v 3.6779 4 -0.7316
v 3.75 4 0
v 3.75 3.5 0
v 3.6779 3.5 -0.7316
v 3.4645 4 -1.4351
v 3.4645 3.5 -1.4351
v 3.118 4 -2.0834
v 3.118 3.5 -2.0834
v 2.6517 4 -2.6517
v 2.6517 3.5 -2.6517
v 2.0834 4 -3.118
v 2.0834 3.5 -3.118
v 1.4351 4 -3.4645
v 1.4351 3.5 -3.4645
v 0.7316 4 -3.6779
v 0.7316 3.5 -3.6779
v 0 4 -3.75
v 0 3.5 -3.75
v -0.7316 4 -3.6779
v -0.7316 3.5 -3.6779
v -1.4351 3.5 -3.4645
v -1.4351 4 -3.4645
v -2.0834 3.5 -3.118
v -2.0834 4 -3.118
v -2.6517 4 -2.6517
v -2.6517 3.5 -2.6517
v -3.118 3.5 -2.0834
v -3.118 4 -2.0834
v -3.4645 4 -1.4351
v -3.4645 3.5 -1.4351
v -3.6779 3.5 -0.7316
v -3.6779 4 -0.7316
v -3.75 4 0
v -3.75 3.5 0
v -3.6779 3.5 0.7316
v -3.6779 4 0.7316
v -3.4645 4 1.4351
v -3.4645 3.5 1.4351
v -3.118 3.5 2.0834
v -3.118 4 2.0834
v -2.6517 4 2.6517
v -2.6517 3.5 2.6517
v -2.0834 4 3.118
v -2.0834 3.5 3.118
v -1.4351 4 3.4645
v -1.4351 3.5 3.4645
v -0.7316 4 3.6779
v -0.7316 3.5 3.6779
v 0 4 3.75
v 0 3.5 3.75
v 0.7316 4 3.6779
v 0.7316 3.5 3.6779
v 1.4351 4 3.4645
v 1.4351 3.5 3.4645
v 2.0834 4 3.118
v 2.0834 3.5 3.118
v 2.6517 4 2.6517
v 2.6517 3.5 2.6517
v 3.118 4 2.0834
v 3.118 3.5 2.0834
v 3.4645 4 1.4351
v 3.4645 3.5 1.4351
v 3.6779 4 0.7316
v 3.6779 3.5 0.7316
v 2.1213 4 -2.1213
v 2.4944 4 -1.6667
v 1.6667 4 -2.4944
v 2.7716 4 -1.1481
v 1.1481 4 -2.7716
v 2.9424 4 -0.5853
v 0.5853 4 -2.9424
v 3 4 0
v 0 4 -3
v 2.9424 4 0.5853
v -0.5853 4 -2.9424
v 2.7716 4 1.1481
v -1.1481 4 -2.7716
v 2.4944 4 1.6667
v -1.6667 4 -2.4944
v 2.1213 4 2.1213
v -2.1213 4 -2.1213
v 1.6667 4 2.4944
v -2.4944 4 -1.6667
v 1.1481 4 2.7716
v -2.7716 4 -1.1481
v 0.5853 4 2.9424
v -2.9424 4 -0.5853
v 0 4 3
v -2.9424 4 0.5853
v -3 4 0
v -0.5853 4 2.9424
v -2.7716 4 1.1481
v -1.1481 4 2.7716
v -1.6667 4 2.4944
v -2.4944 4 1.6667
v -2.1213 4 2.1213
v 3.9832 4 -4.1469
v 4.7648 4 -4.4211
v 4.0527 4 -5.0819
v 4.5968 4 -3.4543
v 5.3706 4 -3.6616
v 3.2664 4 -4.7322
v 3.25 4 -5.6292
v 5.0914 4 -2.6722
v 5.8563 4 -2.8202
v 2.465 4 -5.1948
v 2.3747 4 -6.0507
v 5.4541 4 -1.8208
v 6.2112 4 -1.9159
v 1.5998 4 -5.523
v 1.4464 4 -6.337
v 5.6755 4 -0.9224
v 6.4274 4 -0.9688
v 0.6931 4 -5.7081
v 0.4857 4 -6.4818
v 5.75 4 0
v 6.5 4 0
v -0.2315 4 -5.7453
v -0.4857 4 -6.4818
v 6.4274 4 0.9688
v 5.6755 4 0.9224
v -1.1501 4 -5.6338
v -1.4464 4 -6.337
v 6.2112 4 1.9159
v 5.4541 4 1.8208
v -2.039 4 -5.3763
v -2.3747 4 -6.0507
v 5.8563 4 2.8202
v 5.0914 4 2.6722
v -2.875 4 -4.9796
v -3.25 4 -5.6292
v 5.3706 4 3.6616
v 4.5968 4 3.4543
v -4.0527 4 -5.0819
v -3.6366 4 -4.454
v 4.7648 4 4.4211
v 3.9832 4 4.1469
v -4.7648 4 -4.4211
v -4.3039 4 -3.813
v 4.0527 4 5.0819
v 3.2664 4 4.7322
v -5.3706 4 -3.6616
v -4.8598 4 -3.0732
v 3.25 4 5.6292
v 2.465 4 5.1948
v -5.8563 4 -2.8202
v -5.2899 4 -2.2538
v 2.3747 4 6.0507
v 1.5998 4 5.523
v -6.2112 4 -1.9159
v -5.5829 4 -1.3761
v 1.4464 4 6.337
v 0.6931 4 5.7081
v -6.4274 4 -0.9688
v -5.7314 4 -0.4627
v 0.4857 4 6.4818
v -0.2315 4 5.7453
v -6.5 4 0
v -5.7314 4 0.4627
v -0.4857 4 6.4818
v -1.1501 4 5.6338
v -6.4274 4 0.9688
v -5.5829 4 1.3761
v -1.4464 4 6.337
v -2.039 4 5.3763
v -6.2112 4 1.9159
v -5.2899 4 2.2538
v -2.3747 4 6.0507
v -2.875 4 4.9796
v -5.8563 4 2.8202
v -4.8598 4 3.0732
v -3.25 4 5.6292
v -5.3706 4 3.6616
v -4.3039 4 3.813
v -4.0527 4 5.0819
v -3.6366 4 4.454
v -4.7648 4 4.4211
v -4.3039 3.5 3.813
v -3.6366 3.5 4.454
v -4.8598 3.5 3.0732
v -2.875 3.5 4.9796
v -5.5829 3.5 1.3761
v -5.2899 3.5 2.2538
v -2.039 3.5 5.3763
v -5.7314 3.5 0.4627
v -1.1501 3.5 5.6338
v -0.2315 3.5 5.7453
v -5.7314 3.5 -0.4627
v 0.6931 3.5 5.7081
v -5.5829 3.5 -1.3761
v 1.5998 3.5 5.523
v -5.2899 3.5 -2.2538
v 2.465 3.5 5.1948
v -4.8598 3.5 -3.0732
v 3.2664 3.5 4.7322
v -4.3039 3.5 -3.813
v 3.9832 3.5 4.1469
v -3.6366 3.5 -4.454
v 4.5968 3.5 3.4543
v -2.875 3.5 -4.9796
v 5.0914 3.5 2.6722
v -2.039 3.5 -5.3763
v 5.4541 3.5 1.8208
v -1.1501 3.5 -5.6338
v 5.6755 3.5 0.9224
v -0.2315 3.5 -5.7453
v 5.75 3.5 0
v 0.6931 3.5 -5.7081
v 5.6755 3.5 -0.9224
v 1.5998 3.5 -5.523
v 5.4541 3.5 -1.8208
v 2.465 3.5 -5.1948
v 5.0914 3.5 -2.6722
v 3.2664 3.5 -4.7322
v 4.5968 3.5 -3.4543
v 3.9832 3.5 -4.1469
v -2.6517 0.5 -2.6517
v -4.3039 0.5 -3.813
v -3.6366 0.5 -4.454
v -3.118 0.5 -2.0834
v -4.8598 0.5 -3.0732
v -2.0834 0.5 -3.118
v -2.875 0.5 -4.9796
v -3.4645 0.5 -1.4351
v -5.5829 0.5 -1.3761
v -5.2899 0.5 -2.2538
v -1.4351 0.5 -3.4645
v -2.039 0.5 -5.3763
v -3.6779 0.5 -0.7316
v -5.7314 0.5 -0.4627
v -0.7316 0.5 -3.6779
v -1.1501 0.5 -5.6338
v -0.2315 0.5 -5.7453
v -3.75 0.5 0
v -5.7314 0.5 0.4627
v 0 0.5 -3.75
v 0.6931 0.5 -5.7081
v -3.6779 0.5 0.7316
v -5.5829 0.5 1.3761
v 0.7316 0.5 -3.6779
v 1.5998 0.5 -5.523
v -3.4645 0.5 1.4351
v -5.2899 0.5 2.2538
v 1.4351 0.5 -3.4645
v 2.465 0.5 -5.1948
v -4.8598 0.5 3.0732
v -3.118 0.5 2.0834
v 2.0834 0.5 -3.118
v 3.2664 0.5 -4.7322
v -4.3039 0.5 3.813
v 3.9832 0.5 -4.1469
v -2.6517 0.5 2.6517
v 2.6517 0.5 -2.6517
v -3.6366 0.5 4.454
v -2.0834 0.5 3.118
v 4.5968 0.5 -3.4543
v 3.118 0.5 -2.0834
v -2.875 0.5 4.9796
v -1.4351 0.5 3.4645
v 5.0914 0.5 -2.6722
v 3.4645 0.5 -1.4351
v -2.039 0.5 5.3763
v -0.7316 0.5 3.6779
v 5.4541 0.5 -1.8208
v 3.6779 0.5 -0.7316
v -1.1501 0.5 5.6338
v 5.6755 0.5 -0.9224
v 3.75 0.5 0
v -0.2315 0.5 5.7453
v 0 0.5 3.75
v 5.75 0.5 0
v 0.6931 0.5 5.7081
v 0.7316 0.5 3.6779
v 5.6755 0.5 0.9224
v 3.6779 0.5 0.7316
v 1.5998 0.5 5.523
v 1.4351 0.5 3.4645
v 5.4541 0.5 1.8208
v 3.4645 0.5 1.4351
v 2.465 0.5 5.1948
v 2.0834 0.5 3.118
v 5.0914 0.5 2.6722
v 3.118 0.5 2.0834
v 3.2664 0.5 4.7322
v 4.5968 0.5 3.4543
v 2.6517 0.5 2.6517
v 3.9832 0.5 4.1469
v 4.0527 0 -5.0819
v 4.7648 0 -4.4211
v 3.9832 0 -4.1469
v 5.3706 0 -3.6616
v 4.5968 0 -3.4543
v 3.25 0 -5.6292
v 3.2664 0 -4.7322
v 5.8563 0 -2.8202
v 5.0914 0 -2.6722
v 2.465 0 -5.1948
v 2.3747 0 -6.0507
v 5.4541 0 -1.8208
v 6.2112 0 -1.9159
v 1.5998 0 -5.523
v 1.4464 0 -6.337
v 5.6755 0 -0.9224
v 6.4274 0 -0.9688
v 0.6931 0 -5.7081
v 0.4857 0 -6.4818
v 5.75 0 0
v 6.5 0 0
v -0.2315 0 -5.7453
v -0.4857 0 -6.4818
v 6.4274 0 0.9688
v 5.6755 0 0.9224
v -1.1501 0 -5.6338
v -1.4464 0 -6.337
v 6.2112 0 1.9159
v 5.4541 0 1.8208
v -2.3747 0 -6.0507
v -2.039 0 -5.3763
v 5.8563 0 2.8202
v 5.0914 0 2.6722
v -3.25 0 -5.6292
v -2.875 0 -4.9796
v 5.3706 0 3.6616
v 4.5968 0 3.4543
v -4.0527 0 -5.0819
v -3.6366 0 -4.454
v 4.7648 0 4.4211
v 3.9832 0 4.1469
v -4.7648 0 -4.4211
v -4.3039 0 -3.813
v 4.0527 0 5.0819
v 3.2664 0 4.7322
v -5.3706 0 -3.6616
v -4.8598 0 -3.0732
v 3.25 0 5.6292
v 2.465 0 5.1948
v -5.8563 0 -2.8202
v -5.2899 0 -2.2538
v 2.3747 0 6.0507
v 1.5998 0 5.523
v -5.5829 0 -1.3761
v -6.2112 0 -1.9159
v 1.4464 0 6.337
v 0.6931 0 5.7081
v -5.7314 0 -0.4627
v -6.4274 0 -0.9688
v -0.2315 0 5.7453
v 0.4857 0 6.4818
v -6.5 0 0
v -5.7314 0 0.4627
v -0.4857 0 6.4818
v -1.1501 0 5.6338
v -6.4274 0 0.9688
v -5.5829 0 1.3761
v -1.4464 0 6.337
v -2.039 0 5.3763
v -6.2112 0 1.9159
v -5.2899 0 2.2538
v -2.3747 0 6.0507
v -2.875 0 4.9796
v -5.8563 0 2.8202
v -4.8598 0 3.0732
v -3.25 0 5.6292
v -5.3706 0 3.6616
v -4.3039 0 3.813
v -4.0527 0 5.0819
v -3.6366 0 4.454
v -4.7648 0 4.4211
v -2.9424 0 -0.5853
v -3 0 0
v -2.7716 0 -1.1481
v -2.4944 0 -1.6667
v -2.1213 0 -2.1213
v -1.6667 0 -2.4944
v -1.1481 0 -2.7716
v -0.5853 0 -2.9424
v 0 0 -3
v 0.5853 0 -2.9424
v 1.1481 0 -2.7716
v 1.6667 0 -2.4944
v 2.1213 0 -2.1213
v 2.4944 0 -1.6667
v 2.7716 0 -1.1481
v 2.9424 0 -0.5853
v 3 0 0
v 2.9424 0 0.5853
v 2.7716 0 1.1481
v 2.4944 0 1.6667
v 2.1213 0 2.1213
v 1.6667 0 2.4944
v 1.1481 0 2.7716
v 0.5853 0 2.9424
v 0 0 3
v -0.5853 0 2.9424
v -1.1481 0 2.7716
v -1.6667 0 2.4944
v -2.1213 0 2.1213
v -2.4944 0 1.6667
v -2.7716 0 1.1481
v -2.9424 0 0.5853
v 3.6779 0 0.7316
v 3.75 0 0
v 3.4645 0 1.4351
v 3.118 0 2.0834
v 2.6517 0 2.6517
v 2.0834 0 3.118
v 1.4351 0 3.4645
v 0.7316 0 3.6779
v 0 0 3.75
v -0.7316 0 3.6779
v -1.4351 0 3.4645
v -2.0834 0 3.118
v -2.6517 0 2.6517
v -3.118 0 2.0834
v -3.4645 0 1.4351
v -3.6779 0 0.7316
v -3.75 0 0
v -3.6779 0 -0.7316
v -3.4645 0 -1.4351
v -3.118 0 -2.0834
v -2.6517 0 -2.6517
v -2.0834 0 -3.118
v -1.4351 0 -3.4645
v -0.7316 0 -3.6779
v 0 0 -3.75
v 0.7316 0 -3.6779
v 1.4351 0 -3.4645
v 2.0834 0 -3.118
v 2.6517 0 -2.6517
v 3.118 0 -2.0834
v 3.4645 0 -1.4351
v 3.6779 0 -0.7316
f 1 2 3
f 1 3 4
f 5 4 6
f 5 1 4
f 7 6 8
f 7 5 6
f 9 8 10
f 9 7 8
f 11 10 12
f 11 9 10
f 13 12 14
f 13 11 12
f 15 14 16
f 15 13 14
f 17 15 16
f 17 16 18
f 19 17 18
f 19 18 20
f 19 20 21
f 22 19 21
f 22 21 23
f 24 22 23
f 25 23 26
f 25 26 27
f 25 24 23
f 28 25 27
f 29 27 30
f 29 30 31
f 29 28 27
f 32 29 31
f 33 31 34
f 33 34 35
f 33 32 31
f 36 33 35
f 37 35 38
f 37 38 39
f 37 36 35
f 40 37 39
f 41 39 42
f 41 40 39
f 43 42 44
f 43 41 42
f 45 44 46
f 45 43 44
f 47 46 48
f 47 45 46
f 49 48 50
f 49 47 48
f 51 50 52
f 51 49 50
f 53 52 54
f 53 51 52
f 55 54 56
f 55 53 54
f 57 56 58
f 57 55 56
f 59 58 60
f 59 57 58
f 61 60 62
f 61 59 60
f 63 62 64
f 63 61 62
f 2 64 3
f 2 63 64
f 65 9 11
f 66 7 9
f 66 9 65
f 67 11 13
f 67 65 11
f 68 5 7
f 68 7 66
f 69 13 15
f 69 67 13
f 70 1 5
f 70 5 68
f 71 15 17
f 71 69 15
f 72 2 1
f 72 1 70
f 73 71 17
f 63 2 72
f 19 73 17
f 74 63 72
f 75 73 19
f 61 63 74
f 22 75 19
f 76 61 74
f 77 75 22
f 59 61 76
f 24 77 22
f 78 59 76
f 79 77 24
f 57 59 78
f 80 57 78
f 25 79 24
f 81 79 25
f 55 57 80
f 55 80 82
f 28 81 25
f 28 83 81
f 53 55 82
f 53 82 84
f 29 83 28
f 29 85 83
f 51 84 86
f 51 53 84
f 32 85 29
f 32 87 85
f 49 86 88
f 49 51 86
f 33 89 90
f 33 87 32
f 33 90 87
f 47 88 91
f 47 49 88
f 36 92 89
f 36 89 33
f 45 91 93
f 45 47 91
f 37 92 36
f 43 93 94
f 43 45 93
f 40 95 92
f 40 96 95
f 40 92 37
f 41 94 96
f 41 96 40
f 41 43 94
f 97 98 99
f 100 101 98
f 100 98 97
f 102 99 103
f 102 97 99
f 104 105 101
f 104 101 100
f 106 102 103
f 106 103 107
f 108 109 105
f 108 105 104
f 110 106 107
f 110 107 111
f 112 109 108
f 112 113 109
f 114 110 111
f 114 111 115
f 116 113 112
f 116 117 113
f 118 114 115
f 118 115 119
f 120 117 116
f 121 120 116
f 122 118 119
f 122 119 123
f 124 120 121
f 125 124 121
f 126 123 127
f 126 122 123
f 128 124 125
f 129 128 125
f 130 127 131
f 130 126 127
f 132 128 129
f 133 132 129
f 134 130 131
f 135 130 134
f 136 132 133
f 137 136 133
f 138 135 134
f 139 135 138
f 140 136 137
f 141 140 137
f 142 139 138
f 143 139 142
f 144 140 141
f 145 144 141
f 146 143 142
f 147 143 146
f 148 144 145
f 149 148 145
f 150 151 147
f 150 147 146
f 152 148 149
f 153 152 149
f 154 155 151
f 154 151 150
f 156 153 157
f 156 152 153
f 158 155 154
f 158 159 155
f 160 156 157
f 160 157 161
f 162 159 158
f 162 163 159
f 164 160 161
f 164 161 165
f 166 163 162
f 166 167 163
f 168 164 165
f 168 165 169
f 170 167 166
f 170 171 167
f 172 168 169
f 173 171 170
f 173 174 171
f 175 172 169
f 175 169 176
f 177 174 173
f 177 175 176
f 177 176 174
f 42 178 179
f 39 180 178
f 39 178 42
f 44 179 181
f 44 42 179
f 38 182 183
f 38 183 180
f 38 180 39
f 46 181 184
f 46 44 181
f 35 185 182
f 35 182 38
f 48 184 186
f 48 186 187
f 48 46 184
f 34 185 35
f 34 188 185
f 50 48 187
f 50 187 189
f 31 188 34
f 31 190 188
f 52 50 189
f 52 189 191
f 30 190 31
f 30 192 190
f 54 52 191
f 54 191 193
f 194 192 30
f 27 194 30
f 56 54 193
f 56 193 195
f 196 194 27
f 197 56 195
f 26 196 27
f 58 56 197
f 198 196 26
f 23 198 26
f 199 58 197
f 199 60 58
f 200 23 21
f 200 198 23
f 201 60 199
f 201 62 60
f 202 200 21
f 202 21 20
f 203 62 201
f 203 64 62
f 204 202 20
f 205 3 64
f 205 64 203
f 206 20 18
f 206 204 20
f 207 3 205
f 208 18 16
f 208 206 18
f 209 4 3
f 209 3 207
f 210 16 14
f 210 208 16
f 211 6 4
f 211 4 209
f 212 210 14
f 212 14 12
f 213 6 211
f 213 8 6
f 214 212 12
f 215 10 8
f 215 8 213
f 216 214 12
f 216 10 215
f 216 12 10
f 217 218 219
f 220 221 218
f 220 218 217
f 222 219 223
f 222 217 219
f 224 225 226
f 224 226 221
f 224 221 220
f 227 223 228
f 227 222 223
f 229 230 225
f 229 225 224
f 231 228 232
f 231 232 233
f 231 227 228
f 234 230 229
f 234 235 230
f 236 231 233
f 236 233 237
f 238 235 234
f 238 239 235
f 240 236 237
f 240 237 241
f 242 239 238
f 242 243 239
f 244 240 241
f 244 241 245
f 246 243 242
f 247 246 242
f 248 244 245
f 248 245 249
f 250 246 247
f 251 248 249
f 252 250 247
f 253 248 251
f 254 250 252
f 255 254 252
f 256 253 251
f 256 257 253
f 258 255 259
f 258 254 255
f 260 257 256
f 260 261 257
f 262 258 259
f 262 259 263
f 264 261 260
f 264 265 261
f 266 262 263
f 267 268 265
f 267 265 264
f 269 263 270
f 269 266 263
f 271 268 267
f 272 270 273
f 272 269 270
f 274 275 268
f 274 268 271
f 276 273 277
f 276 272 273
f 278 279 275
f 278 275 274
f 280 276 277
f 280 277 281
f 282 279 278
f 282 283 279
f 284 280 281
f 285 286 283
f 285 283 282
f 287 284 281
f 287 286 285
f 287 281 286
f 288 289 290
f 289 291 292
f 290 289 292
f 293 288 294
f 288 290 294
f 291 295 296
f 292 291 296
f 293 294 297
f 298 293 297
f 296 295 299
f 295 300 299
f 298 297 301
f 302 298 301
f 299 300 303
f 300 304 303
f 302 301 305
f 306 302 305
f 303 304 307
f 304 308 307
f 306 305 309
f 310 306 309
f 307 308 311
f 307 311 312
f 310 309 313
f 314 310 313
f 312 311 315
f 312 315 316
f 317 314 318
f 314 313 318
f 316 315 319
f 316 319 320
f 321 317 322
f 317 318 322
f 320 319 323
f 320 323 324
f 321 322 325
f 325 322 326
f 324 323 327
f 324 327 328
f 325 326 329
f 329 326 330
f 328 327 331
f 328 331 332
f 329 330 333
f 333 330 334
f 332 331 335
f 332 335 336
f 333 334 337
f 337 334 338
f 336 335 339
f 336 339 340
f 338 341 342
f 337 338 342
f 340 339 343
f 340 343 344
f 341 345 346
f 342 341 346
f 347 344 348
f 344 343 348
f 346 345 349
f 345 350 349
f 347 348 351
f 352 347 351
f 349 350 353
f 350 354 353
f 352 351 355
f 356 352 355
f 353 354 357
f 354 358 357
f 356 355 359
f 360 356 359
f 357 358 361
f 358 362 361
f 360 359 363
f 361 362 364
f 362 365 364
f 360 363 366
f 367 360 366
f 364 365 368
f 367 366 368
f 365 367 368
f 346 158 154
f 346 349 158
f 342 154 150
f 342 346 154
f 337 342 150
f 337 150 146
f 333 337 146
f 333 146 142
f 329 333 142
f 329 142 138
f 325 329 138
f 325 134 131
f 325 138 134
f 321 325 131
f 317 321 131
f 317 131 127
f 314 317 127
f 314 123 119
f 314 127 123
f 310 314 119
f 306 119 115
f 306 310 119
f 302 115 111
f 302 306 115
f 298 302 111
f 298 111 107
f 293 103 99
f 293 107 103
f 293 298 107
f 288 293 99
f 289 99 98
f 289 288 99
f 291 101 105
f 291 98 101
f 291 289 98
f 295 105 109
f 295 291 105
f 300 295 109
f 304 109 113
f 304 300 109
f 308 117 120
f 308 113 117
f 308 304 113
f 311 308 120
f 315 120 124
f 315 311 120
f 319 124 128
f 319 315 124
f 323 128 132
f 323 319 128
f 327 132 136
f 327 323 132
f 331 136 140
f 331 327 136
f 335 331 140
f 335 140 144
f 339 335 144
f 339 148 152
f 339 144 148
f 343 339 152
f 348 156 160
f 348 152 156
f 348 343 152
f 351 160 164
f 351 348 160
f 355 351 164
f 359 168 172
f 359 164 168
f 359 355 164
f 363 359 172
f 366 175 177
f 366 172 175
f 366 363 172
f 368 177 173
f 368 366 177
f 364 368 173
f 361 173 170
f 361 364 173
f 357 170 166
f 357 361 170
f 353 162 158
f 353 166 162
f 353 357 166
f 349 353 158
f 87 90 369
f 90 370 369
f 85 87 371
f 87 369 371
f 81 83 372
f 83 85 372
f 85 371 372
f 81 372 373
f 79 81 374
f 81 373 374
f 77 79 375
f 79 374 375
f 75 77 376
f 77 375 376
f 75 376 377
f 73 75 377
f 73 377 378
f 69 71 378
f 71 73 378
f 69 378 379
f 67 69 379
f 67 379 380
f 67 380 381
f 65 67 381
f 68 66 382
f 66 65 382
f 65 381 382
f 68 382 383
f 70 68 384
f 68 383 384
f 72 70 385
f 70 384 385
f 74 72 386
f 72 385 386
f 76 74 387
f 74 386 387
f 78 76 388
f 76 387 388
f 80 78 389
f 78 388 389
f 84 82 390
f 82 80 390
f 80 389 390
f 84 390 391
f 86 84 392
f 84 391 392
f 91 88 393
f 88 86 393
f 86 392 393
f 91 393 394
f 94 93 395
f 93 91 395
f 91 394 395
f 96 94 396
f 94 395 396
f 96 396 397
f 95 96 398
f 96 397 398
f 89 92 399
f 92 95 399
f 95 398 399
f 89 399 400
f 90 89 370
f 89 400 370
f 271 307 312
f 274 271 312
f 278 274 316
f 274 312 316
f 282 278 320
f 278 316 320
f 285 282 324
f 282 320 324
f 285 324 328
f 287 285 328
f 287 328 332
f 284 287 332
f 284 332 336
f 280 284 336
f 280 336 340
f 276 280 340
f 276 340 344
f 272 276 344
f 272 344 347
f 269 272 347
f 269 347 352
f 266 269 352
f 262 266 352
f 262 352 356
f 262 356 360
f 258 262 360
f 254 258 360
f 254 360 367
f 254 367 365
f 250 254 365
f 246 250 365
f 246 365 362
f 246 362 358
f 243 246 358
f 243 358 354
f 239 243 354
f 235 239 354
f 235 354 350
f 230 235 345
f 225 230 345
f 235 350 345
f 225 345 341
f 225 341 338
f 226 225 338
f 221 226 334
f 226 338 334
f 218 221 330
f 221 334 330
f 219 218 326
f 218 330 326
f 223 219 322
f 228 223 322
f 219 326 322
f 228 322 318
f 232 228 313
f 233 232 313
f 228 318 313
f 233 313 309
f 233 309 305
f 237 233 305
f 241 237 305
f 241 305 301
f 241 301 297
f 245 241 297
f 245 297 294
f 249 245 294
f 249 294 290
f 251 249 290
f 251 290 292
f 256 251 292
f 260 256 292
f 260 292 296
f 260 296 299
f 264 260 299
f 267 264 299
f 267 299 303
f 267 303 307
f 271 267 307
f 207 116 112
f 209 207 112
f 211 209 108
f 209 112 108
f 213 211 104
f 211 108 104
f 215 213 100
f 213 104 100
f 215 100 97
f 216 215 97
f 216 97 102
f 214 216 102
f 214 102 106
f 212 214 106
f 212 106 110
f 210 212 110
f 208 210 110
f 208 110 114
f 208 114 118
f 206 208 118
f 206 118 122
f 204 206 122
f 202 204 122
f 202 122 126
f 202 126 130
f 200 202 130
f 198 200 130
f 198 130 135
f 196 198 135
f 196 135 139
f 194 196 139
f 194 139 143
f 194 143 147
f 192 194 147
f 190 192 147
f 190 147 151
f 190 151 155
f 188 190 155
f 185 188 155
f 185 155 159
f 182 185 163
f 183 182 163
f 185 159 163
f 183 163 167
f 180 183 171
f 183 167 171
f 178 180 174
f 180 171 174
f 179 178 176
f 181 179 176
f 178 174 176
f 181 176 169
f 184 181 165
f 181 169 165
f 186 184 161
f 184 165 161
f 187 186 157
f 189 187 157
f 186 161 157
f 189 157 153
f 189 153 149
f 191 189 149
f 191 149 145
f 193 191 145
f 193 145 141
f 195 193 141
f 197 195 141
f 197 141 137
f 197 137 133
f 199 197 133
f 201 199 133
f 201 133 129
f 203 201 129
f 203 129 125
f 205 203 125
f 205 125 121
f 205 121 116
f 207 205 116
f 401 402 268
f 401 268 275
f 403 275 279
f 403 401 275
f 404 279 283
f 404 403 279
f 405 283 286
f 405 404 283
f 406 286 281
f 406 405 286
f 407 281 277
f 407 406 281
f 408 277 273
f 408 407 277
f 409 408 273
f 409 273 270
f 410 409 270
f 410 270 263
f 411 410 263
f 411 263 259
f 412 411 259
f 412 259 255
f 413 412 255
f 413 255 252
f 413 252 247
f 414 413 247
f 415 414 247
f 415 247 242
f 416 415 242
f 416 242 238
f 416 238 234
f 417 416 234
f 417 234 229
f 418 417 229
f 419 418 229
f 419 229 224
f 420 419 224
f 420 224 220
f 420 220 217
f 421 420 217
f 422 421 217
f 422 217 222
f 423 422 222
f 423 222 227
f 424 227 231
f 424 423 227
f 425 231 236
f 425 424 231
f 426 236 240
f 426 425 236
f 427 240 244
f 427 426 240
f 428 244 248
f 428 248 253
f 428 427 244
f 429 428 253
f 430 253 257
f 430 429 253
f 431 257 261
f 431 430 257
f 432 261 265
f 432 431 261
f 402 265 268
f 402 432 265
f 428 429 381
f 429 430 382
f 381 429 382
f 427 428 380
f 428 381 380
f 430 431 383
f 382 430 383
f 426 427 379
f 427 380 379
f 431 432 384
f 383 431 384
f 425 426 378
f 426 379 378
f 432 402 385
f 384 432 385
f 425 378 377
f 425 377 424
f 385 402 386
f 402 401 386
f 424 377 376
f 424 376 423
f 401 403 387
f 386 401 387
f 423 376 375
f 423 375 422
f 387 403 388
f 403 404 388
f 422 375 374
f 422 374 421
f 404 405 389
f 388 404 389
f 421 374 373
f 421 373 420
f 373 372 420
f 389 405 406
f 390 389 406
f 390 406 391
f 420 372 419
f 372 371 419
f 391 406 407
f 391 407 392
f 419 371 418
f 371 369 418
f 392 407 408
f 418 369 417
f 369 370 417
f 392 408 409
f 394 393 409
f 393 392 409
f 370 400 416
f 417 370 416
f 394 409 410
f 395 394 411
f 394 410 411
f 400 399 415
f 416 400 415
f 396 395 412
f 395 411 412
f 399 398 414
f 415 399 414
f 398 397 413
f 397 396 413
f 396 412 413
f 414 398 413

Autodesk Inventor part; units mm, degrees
ref_plane "YZ Plane" through (0, 0, 0) normal (1, 0, 0) x (0, 1, 0)
ref_plane "XZ Plane" through (0, 0, 0) normal (0, 1, 0) x (-1, 0, 0)
ref_plane "XY Plane" through (0, 0, 0) normal (0, 0, 1) x (1, 0, 0)
sketch "草图1" plane through (0, 0, 0) normal (0, 1, 0) x (-1, 0, 0)
  circle A0 centre (0, 0) radius 6.5
  circle A1 centre (0, 0) radius 3
  dimension "d0" = 13
  dimension "d1" = 6
extrude "拉伸1" add sketch "草图1" along normal blind 4
sketch "草图2" plane through (0, 4, 0) normal (0, 1, 0) x (1, 0, 0)
  circle A0 centre (0, 0) radius 3 projected
  circle A1 centre (0, 0) radius 6.5 projected
  circle A2 centre (0, 0) radius 3.75
  circle A3 centre (0, 0) radius 5.75
  dimension "d4" = 11.5
  dimension "d5" = 7.5
extrude "拉伸2" cut sketch "草图2" against normal blind 0.5 contours A3
sketch "草图3" plane through (0, 0, 0) normal (0, -1, 0) x (1, 0, 0)
  circle A0 centre (0, 0) radius 3.75 projected
  circle A1 centre (0, 0) radius 5.75 projected
extrude "拉伸3" cut sketch "草图3" against normal blind 0.5
properties part number "bearing_6_13_5"
